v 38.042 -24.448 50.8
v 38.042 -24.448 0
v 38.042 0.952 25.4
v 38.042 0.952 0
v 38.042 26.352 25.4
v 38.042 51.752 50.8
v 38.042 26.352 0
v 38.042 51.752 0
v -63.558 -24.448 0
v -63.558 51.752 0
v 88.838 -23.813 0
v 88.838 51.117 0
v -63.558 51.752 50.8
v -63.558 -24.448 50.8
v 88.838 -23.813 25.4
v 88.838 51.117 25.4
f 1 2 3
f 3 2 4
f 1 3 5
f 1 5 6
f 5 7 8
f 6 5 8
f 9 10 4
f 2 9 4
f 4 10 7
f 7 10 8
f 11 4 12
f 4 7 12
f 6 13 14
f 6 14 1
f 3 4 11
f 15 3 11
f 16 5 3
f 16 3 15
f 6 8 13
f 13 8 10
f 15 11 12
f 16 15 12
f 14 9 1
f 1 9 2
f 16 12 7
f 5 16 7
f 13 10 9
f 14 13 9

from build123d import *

# Parameters (mm, degrees)
F1_DEPTH = 25.4
F2_DEPTH = 50.8


with BuildPart() as f1:
    # F0 (on Top) → F1 (new body)
    with BuildSketch(Plane.XY):
        Polygon((88.838113, 51.116822), (38.042081, 26.351779), (38.042081, 0.951779), (88.838113, -23.813265), align=None)
    extrude(amount=F1_DEPTH)

    # F0 (on Top) → F2 (join)
    with BuildSketch(Plane.XY):
        Polygon((38.042081, 51.751779), (-63.557919, 51.751779), (-63.557919, -24.448221), (38.042081, -24.448221), (38.042081, 0.951779), (38.042081, 26.351779), align=None)
    extrude(amount=F2_DEPTH)


solid = f1.part
